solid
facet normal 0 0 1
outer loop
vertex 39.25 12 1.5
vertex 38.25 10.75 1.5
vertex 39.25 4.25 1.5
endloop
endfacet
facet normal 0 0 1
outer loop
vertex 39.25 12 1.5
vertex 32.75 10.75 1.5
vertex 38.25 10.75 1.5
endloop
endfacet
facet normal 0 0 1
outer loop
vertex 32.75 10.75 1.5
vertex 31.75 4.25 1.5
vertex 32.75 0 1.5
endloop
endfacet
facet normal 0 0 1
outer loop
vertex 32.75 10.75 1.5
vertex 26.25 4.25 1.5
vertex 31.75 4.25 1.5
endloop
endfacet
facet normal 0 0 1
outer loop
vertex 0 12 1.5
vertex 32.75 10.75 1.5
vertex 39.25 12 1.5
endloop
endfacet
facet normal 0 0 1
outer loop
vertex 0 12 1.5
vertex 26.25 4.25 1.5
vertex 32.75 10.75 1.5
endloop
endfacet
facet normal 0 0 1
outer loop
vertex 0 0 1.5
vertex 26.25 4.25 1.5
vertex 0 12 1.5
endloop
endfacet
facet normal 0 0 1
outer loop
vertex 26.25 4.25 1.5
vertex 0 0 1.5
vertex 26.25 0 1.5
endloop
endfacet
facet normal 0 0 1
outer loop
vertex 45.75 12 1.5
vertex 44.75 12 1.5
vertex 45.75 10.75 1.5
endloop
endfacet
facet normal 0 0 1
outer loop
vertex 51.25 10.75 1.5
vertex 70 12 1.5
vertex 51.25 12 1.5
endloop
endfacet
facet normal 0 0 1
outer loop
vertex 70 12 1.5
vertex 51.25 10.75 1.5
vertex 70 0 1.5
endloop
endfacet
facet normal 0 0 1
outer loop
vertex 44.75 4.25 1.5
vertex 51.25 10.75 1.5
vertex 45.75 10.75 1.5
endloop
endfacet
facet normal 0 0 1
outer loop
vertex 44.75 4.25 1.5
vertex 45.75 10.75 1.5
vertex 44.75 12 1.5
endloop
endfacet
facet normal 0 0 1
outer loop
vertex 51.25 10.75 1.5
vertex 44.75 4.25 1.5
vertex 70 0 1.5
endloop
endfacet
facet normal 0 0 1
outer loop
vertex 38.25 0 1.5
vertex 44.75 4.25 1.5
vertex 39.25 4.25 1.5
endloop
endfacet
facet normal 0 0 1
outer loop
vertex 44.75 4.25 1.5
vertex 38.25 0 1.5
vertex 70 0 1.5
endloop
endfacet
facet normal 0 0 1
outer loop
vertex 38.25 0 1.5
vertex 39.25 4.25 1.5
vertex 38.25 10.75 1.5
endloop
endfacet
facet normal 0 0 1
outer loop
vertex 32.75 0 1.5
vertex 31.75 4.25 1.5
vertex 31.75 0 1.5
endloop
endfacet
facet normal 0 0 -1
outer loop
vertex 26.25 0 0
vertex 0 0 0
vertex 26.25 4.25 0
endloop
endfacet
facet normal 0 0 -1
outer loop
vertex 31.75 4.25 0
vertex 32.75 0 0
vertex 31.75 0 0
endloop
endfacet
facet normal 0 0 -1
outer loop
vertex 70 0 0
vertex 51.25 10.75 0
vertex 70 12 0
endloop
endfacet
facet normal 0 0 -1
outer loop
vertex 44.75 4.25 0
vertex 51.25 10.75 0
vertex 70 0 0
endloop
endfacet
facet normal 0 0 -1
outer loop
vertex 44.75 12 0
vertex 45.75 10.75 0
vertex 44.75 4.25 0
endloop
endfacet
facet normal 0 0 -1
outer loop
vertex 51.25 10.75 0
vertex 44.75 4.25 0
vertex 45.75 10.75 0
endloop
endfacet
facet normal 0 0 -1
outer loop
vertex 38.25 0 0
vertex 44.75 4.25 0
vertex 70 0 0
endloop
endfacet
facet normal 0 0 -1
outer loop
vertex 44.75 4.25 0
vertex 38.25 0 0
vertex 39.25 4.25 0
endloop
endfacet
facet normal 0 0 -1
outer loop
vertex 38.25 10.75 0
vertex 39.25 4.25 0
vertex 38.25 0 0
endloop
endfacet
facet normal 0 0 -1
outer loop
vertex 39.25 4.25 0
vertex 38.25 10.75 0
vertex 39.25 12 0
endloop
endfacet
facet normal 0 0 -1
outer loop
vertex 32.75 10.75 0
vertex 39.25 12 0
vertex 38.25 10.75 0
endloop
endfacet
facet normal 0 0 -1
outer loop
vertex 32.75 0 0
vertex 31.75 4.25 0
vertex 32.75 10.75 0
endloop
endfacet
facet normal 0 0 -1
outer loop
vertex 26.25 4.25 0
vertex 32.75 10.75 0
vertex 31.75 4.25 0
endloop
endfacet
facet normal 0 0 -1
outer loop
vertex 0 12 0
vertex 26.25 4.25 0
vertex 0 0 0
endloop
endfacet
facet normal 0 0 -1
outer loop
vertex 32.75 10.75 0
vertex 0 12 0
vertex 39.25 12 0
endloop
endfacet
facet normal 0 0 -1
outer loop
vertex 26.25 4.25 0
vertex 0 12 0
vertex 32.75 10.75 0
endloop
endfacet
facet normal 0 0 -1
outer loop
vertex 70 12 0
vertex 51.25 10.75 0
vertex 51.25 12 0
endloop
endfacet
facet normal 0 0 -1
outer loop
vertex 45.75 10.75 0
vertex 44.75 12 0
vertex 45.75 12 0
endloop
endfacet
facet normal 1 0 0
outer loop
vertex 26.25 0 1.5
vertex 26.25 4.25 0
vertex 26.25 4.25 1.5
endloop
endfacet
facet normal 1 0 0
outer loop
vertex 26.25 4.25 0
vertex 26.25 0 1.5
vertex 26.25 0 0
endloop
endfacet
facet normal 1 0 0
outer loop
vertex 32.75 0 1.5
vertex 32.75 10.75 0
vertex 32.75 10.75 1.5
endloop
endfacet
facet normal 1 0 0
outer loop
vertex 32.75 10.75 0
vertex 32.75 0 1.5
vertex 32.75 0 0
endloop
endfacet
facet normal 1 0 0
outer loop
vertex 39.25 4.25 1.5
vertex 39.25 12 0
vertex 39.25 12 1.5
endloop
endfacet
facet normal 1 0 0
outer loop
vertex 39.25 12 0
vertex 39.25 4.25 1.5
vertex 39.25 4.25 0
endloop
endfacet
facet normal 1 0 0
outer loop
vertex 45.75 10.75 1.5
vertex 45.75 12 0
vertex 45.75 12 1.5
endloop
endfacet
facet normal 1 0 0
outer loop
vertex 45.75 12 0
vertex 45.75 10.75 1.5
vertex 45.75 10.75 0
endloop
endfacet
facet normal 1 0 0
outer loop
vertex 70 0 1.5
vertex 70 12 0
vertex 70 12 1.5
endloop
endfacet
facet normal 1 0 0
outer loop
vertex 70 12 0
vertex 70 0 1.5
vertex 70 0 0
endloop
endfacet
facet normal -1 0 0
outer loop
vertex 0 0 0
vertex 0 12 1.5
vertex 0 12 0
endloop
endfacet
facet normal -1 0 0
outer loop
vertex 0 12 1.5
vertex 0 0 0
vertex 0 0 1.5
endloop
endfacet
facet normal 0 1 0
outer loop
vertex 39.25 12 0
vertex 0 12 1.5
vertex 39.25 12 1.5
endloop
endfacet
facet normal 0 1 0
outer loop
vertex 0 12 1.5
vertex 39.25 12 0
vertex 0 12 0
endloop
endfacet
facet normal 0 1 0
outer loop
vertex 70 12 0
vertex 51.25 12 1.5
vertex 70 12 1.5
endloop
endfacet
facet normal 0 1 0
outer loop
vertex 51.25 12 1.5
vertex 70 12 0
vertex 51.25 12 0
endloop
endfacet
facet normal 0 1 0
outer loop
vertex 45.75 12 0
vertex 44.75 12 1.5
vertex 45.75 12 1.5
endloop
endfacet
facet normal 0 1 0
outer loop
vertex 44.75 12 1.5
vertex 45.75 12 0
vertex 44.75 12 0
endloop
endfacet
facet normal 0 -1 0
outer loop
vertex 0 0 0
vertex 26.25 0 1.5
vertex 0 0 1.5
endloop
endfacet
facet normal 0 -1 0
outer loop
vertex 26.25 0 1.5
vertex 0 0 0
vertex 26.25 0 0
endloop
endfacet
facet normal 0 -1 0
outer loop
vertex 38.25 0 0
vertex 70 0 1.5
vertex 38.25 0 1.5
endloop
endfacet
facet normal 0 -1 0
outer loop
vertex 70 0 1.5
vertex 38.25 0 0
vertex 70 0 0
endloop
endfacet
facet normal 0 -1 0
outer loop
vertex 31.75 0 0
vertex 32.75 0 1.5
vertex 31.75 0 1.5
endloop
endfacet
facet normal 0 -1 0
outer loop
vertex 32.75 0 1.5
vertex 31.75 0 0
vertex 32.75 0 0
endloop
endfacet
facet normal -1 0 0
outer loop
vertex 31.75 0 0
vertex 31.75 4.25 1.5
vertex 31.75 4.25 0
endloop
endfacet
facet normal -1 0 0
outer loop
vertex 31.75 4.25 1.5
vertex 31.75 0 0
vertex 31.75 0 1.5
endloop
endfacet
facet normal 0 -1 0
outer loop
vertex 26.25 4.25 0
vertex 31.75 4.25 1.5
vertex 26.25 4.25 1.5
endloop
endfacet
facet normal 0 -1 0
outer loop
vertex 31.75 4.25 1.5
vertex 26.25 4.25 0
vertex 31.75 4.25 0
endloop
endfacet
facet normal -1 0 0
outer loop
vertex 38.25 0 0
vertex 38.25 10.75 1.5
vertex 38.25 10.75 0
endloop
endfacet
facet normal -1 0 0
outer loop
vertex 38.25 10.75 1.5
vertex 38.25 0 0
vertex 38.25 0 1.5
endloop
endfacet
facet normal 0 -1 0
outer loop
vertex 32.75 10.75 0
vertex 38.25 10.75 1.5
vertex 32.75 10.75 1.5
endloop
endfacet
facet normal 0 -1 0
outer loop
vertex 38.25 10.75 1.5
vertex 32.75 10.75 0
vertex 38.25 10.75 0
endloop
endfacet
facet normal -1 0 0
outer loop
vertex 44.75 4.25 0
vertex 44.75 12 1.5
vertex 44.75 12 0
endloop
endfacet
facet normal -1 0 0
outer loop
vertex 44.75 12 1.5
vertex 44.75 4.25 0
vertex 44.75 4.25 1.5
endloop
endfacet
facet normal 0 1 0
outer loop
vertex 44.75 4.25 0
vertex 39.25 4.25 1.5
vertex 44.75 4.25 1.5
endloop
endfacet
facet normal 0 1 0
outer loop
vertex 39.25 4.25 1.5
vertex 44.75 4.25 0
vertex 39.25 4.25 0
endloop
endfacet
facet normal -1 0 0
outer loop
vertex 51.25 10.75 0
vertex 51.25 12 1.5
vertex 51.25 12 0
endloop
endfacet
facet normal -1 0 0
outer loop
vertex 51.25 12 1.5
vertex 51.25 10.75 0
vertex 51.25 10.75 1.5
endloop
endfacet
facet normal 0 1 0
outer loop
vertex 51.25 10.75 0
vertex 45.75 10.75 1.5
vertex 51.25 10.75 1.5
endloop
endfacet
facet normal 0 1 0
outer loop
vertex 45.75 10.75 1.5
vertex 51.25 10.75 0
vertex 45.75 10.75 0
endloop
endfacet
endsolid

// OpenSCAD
// Agarose gel comb - a flat plate with a back bar and a row of rectangular teeth, for casting
// horizontal gels. NOVEL general part.
//

cols   = 10;
teeth_d = 5.0;
teeth_l = 12;
pitch  = 1.5;
base_t = 1.5;
back_w = 12;

$fn = 48;

P = max(pitch, teeth_d + 1.5);                 // keep a material wall between teeth
L = 70;                                        // spine length (X)
w = back_w + 2 * teeth_l + (cols - 1) * P;    // total width (Y)

difference() {
    union() {
        cube([L, back_w, base_t]);                 // spine (back bar)
        for (i = [0 : cols - 1])
            translate([L / 2 - (teeth_l + P / 2) + i * P, -(teeth_l + P / 2) + i * P, 0])
                cube([teeth_d, teeth_l, base_t]);   // teeth, hanging in -Y
    }
    for (i = [0 : cols - 1])
        translate([L / 2 - (teeth_l + P / 2) + i * P, -(teeth_l + P / 2) + i * P, -1])
            cube([teeth_d + 0.5, teeth_l + 1, base_t + 2]);   // pocket: 0.25 mm wall around each tooth
}
